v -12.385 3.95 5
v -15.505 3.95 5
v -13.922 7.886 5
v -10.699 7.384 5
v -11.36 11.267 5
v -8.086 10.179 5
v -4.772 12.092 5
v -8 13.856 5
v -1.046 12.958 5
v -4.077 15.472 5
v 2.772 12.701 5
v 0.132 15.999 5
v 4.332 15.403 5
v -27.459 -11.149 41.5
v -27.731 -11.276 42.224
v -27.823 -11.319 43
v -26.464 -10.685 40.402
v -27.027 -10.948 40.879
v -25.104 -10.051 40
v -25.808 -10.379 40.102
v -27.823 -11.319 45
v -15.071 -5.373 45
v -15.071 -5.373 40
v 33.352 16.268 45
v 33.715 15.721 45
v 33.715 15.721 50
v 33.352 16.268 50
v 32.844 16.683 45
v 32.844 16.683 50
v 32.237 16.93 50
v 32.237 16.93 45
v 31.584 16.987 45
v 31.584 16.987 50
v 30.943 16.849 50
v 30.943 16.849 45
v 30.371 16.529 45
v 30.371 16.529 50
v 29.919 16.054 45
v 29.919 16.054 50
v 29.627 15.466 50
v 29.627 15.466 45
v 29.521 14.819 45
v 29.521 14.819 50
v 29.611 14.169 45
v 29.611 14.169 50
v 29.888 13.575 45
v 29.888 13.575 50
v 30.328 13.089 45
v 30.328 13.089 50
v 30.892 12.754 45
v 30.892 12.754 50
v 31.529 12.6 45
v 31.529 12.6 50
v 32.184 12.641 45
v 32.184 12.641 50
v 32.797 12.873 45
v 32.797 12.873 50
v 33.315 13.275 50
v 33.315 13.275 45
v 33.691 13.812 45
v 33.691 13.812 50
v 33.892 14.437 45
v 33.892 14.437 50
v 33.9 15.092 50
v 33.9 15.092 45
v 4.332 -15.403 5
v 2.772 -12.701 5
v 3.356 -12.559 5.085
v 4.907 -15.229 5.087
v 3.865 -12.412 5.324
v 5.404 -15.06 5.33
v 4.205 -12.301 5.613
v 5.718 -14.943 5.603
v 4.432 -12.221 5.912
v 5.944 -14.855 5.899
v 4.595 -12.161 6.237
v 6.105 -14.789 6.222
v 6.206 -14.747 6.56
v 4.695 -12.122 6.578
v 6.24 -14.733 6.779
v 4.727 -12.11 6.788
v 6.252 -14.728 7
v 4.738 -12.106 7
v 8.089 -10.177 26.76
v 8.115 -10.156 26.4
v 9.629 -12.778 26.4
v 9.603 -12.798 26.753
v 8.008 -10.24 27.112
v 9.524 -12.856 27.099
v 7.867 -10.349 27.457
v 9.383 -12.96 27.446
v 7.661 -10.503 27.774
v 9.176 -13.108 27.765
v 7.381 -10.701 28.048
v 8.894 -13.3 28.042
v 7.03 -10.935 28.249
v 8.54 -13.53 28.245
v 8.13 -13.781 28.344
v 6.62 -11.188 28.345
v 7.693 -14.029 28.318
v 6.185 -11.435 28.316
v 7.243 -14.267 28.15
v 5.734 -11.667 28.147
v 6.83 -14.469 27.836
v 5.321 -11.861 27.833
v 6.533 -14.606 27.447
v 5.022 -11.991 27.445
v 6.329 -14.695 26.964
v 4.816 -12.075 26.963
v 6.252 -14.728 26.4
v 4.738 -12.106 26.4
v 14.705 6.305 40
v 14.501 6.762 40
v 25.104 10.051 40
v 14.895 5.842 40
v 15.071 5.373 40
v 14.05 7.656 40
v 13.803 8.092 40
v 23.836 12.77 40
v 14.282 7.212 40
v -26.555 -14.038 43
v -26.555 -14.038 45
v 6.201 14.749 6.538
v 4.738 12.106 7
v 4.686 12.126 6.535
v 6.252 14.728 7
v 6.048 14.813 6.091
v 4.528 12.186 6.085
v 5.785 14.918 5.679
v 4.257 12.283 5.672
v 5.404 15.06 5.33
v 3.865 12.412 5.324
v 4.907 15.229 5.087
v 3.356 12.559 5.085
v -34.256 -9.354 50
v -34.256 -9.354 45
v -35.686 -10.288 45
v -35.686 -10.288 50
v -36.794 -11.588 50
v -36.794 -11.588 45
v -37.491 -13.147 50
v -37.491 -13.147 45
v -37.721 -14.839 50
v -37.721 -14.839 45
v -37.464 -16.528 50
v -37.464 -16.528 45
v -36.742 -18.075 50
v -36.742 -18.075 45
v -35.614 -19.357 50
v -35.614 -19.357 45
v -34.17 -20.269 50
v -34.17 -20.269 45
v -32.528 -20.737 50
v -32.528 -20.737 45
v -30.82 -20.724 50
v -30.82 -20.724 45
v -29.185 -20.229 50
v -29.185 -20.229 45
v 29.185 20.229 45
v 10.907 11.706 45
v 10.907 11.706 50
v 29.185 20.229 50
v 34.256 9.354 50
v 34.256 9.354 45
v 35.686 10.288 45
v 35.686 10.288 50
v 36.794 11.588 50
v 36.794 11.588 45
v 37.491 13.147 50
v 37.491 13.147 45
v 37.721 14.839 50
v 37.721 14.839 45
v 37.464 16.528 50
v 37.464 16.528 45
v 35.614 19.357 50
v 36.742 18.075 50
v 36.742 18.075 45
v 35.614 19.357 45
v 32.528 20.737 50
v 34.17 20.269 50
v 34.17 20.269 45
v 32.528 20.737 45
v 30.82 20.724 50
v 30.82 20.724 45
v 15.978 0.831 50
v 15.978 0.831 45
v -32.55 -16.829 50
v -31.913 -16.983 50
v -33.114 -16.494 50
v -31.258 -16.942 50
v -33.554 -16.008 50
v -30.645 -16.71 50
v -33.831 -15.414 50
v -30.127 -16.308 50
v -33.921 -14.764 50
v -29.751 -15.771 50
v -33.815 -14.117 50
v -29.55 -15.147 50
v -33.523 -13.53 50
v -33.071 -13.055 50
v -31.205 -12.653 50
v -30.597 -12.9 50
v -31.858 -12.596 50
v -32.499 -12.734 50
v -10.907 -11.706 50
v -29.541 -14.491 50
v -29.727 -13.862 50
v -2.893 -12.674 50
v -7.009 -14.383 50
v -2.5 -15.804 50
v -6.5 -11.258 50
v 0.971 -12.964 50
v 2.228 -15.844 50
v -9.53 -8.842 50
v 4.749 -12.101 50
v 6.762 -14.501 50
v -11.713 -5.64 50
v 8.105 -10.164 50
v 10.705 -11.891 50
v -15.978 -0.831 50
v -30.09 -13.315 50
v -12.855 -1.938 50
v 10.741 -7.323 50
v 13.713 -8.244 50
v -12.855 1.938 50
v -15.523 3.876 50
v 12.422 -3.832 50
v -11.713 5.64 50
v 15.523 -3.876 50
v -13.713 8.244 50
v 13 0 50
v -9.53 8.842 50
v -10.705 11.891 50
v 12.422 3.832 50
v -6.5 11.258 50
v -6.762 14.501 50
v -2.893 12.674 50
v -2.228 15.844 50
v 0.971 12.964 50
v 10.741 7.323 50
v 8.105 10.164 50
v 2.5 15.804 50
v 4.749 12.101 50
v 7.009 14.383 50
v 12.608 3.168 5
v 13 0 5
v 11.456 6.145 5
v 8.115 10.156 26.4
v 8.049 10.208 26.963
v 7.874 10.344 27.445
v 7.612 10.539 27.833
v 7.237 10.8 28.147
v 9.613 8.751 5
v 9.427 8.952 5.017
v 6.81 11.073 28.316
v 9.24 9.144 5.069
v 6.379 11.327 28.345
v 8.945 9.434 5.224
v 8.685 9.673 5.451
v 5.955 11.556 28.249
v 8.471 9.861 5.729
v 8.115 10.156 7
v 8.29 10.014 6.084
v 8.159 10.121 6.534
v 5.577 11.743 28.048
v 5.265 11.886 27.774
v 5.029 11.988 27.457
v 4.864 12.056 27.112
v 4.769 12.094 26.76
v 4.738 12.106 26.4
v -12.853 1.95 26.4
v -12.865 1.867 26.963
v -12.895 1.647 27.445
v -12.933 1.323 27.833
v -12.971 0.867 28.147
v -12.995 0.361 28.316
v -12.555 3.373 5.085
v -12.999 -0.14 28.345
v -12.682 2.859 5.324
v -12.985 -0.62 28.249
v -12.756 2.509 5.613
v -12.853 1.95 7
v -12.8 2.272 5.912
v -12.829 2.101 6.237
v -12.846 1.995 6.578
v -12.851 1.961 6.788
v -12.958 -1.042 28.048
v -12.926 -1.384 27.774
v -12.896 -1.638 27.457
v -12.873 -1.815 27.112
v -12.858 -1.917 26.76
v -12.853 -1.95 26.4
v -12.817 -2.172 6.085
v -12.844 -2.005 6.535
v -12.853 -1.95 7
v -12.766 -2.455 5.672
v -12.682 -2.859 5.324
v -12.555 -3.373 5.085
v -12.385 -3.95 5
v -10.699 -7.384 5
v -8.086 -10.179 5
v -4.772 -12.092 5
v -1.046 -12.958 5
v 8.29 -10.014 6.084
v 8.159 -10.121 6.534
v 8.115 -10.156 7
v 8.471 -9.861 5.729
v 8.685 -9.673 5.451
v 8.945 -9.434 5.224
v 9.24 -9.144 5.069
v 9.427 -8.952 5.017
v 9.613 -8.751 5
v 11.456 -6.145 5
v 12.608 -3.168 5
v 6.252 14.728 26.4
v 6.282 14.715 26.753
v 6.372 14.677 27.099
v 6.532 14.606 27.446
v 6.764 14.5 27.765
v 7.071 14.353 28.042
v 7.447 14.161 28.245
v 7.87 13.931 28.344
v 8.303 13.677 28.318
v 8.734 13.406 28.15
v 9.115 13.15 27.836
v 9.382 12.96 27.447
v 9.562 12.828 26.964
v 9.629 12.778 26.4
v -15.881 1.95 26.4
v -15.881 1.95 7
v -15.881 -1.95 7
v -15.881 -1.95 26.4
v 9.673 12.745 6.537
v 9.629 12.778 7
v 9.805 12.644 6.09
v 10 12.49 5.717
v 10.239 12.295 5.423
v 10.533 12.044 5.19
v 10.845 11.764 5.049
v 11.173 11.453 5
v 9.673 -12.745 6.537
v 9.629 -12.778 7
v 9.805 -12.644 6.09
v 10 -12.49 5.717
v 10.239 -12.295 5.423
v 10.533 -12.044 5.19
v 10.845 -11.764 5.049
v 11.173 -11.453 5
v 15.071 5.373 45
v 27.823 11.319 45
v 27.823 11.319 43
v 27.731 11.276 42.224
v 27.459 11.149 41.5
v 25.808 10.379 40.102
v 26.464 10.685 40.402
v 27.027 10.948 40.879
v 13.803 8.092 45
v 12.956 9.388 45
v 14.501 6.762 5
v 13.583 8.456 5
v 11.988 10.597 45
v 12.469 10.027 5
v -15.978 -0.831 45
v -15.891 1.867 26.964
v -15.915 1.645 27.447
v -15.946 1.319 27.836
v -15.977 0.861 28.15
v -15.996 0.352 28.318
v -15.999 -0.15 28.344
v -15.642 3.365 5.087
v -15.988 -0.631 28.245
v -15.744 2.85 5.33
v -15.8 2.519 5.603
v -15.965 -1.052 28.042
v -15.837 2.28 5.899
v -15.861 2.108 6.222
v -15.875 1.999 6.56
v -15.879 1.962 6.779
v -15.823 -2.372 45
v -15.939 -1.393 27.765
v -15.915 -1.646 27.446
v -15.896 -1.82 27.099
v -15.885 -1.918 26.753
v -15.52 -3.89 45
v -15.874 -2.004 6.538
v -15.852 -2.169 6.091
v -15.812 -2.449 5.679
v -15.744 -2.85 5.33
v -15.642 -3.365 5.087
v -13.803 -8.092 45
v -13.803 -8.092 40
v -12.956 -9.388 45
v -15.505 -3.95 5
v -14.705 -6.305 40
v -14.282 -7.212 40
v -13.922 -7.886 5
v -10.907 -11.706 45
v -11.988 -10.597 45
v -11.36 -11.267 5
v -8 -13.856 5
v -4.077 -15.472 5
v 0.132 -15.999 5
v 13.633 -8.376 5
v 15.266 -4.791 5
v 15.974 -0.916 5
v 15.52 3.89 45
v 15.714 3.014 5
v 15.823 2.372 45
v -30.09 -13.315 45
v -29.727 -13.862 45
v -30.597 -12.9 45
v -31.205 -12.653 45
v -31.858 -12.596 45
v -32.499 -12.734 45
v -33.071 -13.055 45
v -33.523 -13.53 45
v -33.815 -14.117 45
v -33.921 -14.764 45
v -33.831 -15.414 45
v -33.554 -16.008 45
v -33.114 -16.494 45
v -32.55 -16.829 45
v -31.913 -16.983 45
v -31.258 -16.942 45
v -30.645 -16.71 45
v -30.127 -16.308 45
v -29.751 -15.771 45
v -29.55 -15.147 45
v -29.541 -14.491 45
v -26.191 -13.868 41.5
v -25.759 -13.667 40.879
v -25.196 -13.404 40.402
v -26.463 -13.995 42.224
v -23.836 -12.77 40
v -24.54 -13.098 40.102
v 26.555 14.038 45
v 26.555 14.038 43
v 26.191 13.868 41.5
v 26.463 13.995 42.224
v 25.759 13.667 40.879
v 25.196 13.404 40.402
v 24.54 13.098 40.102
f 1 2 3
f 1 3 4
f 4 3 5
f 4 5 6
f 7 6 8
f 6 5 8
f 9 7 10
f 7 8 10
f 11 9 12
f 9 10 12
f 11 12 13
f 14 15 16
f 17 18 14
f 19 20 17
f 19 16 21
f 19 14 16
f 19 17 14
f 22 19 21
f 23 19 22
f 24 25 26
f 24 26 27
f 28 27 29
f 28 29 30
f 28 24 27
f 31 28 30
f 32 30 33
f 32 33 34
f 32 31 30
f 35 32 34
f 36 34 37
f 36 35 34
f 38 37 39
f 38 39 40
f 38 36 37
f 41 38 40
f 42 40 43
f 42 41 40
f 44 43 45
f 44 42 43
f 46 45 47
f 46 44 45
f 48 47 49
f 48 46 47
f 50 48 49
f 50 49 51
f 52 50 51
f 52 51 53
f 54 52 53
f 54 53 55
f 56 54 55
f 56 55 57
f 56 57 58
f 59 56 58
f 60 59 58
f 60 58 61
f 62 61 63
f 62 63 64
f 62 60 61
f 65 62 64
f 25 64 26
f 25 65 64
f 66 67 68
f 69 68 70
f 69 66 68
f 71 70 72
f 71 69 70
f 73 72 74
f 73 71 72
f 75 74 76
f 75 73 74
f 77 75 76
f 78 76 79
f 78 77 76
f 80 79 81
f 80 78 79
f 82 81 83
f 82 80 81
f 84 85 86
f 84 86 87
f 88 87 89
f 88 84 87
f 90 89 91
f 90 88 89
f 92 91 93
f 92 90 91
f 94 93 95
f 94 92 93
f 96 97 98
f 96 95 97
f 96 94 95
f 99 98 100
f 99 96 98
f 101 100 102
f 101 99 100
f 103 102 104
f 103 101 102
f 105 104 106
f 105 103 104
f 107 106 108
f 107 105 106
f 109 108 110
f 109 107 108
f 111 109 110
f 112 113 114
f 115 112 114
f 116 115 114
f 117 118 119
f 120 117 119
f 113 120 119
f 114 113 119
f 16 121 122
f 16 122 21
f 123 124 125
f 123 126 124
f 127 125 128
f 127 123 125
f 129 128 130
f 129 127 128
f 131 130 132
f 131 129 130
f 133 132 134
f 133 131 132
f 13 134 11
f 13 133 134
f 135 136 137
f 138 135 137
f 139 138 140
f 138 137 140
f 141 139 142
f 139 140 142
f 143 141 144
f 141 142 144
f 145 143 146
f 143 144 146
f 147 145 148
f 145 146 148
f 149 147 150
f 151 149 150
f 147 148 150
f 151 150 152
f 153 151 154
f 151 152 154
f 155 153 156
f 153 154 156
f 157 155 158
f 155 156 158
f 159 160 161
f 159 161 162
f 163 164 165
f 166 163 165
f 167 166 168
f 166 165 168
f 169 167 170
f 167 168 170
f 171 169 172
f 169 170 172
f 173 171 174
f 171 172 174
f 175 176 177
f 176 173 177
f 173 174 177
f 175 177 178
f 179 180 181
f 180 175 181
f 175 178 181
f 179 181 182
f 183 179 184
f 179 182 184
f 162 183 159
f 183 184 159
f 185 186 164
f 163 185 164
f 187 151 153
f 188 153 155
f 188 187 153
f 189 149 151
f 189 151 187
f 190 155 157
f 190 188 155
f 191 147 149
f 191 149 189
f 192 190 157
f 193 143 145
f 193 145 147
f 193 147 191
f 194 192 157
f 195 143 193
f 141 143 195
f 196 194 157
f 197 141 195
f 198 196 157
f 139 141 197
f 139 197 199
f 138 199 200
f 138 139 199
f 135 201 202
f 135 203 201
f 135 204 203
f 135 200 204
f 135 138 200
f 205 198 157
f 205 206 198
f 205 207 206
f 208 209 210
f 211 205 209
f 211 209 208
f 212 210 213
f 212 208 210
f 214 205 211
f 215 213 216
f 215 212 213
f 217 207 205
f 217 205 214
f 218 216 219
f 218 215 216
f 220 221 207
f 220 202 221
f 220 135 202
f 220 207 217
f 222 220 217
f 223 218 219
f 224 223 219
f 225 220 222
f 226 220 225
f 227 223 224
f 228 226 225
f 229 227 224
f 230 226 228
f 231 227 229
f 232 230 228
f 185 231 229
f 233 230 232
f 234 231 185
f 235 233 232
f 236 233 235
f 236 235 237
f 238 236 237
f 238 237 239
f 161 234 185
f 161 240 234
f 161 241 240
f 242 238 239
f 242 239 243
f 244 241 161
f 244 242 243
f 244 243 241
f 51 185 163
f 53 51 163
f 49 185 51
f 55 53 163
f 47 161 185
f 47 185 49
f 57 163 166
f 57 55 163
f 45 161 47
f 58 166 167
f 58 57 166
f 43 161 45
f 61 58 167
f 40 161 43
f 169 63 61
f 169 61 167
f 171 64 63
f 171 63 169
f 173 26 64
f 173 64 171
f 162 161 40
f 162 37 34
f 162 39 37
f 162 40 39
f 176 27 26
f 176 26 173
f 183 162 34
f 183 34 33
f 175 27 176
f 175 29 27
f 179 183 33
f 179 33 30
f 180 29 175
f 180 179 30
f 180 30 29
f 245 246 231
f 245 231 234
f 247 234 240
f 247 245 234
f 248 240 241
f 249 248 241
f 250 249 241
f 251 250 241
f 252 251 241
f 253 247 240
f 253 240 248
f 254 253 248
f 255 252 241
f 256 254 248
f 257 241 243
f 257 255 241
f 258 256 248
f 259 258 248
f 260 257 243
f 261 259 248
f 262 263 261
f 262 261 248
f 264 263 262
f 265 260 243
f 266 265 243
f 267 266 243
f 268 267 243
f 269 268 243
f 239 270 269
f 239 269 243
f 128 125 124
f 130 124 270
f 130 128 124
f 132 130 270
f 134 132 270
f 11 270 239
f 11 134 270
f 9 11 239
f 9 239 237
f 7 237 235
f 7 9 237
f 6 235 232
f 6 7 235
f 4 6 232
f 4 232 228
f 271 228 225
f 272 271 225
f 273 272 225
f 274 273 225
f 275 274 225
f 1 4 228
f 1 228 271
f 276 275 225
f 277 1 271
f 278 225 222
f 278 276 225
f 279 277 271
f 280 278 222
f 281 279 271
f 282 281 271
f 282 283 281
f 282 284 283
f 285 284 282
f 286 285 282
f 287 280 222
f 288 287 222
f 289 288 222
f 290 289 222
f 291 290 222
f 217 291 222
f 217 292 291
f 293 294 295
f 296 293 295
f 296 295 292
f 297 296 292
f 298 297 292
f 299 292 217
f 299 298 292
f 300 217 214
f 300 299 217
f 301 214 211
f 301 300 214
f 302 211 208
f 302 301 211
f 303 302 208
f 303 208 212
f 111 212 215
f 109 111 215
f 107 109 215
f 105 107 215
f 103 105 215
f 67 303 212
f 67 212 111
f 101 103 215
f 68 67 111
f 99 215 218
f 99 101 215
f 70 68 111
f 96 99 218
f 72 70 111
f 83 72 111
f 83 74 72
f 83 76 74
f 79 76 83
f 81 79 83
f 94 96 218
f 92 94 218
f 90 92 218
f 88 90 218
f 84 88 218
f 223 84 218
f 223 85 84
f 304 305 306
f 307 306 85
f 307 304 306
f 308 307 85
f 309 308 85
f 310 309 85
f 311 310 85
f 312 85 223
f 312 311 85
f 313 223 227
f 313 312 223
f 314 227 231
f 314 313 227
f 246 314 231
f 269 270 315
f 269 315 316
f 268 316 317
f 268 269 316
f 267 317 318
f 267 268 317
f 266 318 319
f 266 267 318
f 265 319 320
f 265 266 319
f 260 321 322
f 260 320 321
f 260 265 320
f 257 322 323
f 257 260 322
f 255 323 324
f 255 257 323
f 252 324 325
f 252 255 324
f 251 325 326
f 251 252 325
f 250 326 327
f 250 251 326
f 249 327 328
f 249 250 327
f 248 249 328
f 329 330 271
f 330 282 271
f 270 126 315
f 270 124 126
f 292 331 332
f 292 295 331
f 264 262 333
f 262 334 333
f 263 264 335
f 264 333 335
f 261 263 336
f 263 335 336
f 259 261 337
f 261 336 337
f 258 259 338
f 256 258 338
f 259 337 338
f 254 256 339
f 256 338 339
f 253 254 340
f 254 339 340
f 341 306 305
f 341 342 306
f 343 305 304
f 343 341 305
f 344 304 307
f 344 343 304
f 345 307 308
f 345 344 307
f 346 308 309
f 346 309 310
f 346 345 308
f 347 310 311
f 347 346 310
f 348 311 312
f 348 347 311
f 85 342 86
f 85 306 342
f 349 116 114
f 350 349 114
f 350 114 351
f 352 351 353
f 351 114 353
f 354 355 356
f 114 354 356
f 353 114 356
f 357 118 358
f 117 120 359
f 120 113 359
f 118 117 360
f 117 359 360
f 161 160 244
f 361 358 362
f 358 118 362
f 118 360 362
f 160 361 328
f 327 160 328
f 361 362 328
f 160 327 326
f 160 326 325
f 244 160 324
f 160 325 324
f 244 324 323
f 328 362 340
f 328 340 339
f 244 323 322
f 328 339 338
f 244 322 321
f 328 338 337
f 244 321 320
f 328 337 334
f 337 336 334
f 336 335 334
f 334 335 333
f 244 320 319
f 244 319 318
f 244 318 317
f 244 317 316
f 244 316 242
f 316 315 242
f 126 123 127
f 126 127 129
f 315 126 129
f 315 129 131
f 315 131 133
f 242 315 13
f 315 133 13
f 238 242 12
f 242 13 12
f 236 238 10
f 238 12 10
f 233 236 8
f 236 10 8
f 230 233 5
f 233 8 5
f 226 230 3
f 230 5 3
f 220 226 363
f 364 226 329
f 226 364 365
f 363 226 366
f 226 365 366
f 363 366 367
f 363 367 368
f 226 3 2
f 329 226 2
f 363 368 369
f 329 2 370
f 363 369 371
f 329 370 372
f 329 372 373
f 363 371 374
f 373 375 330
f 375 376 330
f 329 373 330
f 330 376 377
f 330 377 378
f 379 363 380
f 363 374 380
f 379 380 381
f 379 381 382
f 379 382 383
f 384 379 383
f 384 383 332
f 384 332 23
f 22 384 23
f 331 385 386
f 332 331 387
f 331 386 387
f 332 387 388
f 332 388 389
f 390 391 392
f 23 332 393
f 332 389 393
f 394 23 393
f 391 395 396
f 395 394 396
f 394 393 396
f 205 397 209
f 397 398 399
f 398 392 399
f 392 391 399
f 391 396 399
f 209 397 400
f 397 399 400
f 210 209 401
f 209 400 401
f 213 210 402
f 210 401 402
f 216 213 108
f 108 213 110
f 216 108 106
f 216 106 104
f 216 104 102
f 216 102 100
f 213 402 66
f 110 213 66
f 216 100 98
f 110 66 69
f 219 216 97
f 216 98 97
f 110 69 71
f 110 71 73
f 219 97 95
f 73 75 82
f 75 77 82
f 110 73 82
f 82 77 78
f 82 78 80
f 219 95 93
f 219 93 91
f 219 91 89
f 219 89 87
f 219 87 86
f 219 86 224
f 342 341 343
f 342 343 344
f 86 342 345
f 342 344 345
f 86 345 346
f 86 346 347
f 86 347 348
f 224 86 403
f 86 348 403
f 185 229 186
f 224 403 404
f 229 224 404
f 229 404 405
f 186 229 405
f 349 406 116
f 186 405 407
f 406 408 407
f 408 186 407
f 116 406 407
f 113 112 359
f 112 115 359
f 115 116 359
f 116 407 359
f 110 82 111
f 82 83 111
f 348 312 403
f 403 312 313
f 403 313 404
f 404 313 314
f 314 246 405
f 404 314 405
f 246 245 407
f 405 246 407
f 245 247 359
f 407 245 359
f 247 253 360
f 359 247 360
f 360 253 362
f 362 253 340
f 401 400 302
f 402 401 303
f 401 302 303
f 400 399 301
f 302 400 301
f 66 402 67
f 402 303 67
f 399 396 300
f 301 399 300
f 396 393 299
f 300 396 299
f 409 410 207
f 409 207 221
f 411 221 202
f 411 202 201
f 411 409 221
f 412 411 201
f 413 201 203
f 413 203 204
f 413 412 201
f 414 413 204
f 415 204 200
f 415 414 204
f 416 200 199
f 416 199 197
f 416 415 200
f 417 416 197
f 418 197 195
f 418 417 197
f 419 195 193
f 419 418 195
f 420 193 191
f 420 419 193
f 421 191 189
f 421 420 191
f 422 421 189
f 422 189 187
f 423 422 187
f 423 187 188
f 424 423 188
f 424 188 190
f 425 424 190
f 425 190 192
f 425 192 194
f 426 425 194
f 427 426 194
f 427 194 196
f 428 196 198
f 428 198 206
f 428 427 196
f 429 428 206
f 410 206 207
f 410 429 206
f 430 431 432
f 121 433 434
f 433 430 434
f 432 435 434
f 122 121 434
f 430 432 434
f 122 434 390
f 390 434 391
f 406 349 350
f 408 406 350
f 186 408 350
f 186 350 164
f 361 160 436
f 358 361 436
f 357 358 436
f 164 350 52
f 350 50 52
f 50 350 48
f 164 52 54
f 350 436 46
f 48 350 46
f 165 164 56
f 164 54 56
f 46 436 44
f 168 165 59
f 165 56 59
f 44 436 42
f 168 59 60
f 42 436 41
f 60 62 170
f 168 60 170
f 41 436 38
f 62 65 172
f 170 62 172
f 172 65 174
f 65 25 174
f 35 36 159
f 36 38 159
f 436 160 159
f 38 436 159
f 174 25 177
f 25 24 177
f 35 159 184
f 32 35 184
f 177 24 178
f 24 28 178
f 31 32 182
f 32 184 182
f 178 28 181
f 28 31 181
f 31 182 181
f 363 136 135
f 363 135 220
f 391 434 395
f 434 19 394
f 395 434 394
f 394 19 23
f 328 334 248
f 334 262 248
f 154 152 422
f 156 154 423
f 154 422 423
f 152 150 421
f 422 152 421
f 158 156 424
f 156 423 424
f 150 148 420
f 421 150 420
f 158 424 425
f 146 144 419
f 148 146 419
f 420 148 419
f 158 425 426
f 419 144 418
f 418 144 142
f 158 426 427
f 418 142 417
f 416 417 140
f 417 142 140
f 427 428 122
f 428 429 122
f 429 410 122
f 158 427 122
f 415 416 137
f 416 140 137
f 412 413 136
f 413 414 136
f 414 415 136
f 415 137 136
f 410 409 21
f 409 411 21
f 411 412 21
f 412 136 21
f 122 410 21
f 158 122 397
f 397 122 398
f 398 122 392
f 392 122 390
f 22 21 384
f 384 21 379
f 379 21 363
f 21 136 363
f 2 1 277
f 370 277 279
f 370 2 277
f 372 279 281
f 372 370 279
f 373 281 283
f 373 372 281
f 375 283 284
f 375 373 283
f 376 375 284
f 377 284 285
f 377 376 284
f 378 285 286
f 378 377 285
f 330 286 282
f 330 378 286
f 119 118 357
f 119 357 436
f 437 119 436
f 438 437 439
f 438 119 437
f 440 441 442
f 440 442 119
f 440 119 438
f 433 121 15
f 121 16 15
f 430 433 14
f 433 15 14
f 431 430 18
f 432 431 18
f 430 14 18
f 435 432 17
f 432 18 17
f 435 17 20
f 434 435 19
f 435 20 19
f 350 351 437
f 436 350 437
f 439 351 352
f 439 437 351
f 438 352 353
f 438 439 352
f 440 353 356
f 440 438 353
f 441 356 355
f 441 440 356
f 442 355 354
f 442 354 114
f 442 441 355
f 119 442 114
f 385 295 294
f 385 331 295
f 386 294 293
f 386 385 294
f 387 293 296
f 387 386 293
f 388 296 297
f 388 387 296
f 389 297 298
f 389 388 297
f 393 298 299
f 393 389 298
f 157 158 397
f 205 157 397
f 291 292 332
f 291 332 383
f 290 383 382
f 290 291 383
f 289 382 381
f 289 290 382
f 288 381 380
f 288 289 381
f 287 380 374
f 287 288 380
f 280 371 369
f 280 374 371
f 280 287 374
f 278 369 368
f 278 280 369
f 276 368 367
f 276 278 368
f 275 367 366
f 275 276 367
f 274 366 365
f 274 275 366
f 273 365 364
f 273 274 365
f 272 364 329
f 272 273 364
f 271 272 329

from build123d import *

# Parameters (mm, degrees)
CYLINDER024_R             = 13
CYLINDER024_DEPTH         = 45
CYLINDER026_R             = 1.95
CYLINDER026_DEPTH         = 10
BOX002_W                  = 21.4
BOX002_H                  = 3.9
BOX002_DEPTH              = 10
FUSION013_PLACEMENT_ANGLE = 90
ARRAY011_COUNT            = 3
CYLINDER028_R             = 2.2
CYLINDER028_DEPTH         = 5
ARRAY013_X_COUNT          = 2
ARRAY013_X_PITCH          = 70
BOX003_W                  = 70
BOX003_H                  = 12
BOX003_DEPTH              = 5
BOX007_W                  = 60
BOX007_H                  = 3
BOX007_DEPTH              = 5
FILLET003_R               = 3
CYLINDER027_R             = 6
CYLINDER027_DEPTH         = 5
ARRAY012_X_COUNT          = 2
ARRAY012_X_PITCH          = 70
CYLINDER025_R             = 16
CYLINDER025_DEPTH         = 45
FUSION016_PLACEMENT_ANGLE = 25
FILLET005_R               = 2


with BuildPart() as internal_cylinder:
    # Cylinder024 → Cylinder024 (new body)
    with BuildSketch(Plane.XY.offset(5)):
        Circle(CYLINDER024_R)
    extrude(amount=CYLINDER024_DEPTH)


with BuildPart() as hole_side001:
    # Cylinder026 → Cylinder026 (new body)
    with BuildSketch(Plane(origin=(21.4, 0, 0), x_dir=(1, 0, 0), z_dir=(0, 0, 1))):
        Circle(CYLINDER026_R)
    extrude(amount=CYLINDER026_DEPTH)


with BuildPart() as middle_hole_fusion:
    # Box002 → Box002 (new body)
    with BuildSketch(Plane(origin=(0, -1.95, 0), x_dir=(1, 0, 0), z_dir=(0, 0, 1))):
        with Locations((10.7, 1.95)):
            Rectangle(BOX002_W, BOX002_H)
    extrude(amount=BOX002_DEPTH)

    # Fusion013: union hole side001
    add(hole_side001.part)


with BuildPart() as middle_hole_fusion_1:
    # Fusion013 placement: moved
    add(middle_hole_fusion.part.moved(Location((-6, 0, 0))).rotate(Axis((-6, 0, 0), (0, -1, 0)), FUSION013_PLACEMENT_ANGLE))

    # Array011: middle hole fusion ×3 about axis
    array011_axis = Axis((0, 0, 0), (0, 0, 1))


with BuildPart() as middle_hole_fusion_2:
    add(middle_hole_fusion_1.part)
    for i in range(1, ARRAY011_COUNT):
        add(middle_hole_fusion_1.part.rotate(array011_axis, i * 360 / ARRAY011_COUNT))


with BuildPart() as middle_hole_fusion_3:
    # Array011 placement: moved
    add(middle_hole_fusion_2.part.moved(Location((0, 0, 5))))

    # Fusion014: union internal cylinder
    add(internal_cylinder.part)


with BuildPart() as spring_plate_end_array001:
    # Cylinder028 → Cylinder028 (new body)
    with BuildSketch(Plane.XY):
        Circle(CYLINDER028_R)
    extrude(amount=CYLINDER028_DEPTH)

    # Array013 X: spring plate end array001 ×2


with BuildPart() as spring_plate_end_array001_1:
    add(spring_plate_end_array001.part)
    with Locations(*[(i * ARRAY013_X_PITCH, 0, 0) for i in range(1, ARRAY013_X_COUNT)]):
        add(spring_plate_end_array001.part)


with BuildPart() as spring_plate_cube:
    # Box003 → Box003 (new body)
    with BuildSketch(Plane(origin=(0, -6, 0), x_dir=(1, 0, 0), z_dir=(0, 0, 1))):
        with Locations((35, 6)):
            Rectangle(BOX003_W, BOX003_H)
    extrude(amount=BOX003_DEPTH)


with BuildPart() as fillet003:
    # Box007 → Box007 (new body)
    with BuildSketch(Plane(origin=(5, -1.5, -5), x_dir=(1, 0, 0), z_dir=(0, 0, 1))):
        with Locations((30, 1.5)):
            Rectangle(BOX007_W, BOX007_H)
    extrude(amount=BOX007_DEPTH)

    # Fillet003
    fillet003_edges = [fillet003.edges().sort_by_distance(p)[0] for p in [
        (5, 0, -5),
        (65, 0, -5),
    ]]
    fillet(fillet003_edges, radius=FILLET003_R)


with BuildPart() as spring_attachment_plate:
    # Cylinder027 → Cylinder027 (new body)
    with BuildSketch(Plane.XY):
        Circle(CYLINDER027_R)
    extrude(amount=CYLINDER027_DEPTH)

    # Array012 X: spring attachment plate ×2


with BuildPart() as spring_attachment_plate_1:
    add(spring_attachment_plate.part)
    with Locations(*[(i * ARRAY012_X_PITCH, 0, 0) for i in range(1, ARRAY012_X_COUNT)]):
        add(spring_attachment_plate.part)

    # Fusion015: union spring plate cube, Fillet003
    add(spring_plate_cube.part)
    add(fillet003.part)

    # Cut009: cut spring plate end array001
    add(spring_plate_end_array001_1.part, mode=Mode.SUBTRACT)


with BuildPart() as spring_attachment_plate_2:
    # Cut009 placement: moved
    add(spring_attachment_plate_1.part.moved(Location((-35, 0, 45))))


with BuildPart() as middle_cut_fillet:
    # Cylinder025 → Cylinder025 (new body)
    with BuildSketch(Plane.XY.offset(5)):
        Circle(CYLINDER025_R)
    extrude(amount=CYLINDER025_DEPTH)

    # Fusion016: union spring attachment plate
    add(spring_attachment_plate_2.part)


with BuildPart() as middle_cut_fillet_1:
    # Fusion016 placement: moved
    add(middle_cut_fillet.part.rotate(Axis((0, 0, 0), (0, 0, 1)), FUSION016_PLACEMENT_ANGLE))

    # Cut008: cut middle hole fusion
    add(middle_hole_fusion_3.part, mode=Mode.SUBTRACT)

    # Fillet005
    fillet005_edges = [middle_cut_fillet_1.edges().sort_by_distance(p)[0] for p in [
        (8.872161, -11.467033, 5),
        (8.872161, 11.467033, 5),
        (5.494662, -13.417033, 5),
        (-14.366823, -1.95, 5),
        (-14.366823, 1.95, 5),
        (5.494662, 13.417033, 5),
    ]]
    fillet(fillet005_edges, radius=FILLET005_R)


solid = middle_cut_fillet_1.part
